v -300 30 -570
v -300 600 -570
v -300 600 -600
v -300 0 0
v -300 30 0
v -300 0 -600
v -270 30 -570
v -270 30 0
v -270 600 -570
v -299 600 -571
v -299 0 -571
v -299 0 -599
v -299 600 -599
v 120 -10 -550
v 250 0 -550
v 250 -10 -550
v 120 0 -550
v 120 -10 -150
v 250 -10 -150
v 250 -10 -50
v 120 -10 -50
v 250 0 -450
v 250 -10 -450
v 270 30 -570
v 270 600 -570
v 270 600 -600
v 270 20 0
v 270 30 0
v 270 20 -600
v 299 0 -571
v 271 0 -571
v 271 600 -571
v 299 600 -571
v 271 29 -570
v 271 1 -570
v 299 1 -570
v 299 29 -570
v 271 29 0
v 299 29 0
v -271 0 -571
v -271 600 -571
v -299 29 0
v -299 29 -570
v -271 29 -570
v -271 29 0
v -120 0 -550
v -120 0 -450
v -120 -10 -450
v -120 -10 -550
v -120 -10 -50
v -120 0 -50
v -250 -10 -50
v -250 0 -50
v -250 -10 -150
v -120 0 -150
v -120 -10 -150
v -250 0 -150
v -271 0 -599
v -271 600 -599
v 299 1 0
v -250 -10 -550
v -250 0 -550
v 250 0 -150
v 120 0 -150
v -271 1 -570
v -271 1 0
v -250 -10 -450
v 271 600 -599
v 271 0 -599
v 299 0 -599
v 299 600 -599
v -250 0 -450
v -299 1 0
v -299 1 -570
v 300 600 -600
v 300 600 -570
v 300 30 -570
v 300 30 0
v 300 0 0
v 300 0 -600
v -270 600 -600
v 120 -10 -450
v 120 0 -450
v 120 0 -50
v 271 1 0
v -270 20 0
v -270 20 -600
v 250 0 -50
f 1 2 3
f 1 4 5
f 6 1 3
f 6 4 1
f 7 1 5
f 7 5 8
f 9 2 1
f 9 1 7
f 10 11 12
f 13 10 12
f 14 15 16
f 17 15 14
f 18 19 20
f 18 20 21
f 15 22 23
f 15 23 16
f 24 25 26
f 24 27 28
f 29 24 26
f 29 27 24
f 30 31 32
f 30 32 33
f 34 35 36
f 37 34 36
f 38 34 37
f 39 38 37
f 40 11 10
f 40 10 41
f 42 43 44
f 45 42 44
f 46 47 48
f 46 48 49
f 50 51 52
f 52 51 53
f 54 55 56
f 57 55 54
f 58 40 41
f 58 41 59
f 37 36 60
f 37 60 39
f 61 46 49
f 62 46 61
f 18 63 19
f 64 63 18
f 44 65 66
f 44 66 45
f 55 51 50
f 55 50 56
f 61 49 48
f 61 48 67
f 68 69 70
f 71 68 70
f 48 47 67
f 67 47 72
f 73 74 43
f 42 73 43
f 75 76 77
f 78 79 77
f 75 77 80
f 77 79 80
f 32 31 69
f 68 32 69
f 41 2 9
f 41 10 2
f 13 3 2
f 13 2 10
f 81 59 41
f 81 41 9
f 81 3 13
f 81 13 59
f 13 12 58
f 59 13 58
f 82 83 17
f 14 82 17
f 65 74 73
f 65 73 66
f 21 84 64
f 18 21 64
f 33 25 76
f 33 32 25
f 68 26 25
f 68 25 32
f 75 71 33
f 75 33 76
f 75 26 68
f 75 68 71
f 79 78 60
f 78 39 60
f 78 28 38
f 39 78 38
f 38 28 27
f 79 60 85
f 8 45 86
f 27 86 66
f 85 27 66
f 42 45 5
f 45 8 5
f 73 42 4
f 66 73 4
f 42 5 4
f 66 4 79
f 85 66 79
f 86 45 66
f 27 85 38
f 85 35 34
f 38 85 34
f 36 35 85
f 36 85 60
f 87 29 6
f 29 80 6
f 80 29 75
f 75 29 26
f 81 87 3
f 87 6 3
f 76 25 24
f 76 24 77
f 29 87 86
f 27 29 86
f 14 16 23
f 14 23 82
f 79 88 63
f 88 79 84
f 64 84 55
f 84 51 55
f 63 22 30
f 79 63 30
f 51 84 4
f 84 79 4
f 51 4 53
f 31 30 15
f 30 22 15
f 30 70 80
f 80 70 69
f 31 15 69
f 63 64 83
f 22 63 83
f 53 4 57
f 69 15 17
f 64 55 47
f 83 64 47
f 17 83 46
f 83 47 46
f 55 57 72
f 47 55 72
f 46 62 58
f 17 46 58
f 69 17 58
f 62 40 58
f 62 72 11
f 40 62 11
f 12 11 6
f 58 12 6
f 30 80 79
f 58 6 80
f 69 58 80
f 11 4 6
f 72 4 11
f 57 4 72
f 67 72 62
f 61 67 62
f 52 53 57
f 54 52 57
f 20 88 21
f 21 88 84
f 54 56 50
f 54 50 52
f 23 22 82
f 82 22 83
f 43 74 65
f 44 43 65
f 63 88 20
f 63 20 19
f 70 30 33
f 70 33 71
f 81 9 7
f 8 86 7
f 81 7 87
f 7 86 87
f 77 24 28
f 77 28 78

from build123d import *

# Parameters (mm, degrees)
SKETCH1_W                  = 30
SKETCH1_H                  = 30
SKETCH1_W_2                = 28
SKETCH1_H_2                = 28
EXTRUDE_THIN1_DEPTH        = 570
EXTRUDE_THIN1_2_DEPTH      = 570
EXTRUDE_THIN2_DEPTH        = 570
EXTRUDE_THIN2_DEPTH_BACK   = 30
SKETCH3_W                  = 30
SKETCH3_H                  = 30
SKETCH3_W_2                = 28
SKETCH3_H_2                = 28
EXTRUDE_THIN2_2_DEPTH      = 570
EXTRUDE_THIN2_2_DEPTH_BACK = 30
BOSS_EXTRUDE1_DEPTH        = 540
SKETCH5_W                  = 130
SKETCH5_H                  = 100
BOSS_EXTRUDE2_DEPTH        = 10


with BuildPart() as part:
    # Sketch1 → Extrude-Thin1 (new body)
    with BuildSketch(Plane.XY):
        with Locations((-285, 15)):
            Rectangle(SKETCH1_W, SKETCH1_H)
        with Locations((-285, 15)):
            Rectangle(SKETCH1_W_2, SKETCH1_H_2, mode=Mode.SUBTRACT)
    extrude(amount=-EXTRUDE_THIN1_DEPTH)



with BuildPart() as body_2:
    # Sketch1 → Extrude-Thin1 2 (new body)
    with BuildSketch(Plane.XY):
        with Locations((285, 15)):
            Rectangle(SKETCH1_W, SKETCH1_H)
        with Locations((285, 15)):
            Rectangle(SKETCH1_W_2, SKETCH1_H_2, mode=Mode.SUBTRACT)
    extrude(amount=-EXTRUDE_THIN1_2_DEPTH)


with BuildPart() as body_3:
    # Sketch3 → Extrude-Thin2 (new, two sides: drawn at the far end of the back side and taken through both)
    with BuildSketch(Plane(origin=(0, 30, 0), x_dir=(1, 0, 0), z_dir=(0, 1, 0)).offset(-EXTRUDE_THIN2_DEPTH_BACK)):
        with Locations((-285, 585)):
            Rectangle(SKETCH3_W, SKETCH3_H)
        with Locations((-285, 585)):
            Rectangle(SKETCH3_W_2, SKETCH3_H_2, mode=Mode.SUBTRACT)
    extrude(amount=EXTRUDE_THIN2_DEPTH + EXTRUDE_THIN2_DEPTH_BACK)


with BuildPart() as body_4:
    # Sketch3 → Extrude-Thin2 2 (new, two sides: drawn at the far end of the back side and taken through both)
    with BuildSketch(Plane(origin=(0, 30, 0), x_dir=(1, 0, 0), z_dir=(0, 1, 0)).offset(-EXTRUDE_THIN2_2_DEPTH_BACK)):
        with Locations((285, 585)):
            Rectangle(SKETCH3_W, SKETCH3_H)
        with Locations((285, 585)):
            Rectangle(SKETCH3_W_2, SKETCH3_H_2, mode=Mode.SUBTRACT)
    extrude(amount=EXTRUDE_THIN2_2_DEPTH + EXTRUDE_THIN2_2_DEPTH_BACK)


with BuildPart() as part_1:
    add(part.part)

    add(body_2.part)  # Boss-Extrude1 merges body 2

    add(body_3.part)  # Boss-Extrude1 merges body 3

    add(body_4.part)  # Boss-Extrude1 merges body 4
    # Sketch4 → Boss-Extrude1 (add)
    with BuildSketch(Plane(origin=(-270, 0, 0), x_dir=(0, 0, -1), z_dir=(1, 0, 0))):
        Polygon((600, 0), (600, 20), (570, 20), (0, 20), (0, 0), (570, 0), align=None)
    extrude(amount=BOSS_EXTRUDE1_DEPTH)

    # Sketch5 → Boss-Extrude2 (add)
    with BuildSketch(Plane(origin=(0, 0, 0), x_dir=(-1, 0, 0), z_dir=(0, -1, 0))):
        with Locations((-185, 500)):
            Rectangle(SKETCH5_W, SKETCH5_H)
        with Locations((185, 500)):
            Rectangle(SKETCH5_W, SKETCH5_H)
        with Locations((185, 100)):
            Rectangle(SKETCH5_W, SKETCH5_H)
        with Locations((-185, 100)):
            Rectangle(SKETCH5_W, SKETCH5_H)
    extrude(amount=BOSS_EXTRUDE2_DEPTH)


solid = part_1.part
